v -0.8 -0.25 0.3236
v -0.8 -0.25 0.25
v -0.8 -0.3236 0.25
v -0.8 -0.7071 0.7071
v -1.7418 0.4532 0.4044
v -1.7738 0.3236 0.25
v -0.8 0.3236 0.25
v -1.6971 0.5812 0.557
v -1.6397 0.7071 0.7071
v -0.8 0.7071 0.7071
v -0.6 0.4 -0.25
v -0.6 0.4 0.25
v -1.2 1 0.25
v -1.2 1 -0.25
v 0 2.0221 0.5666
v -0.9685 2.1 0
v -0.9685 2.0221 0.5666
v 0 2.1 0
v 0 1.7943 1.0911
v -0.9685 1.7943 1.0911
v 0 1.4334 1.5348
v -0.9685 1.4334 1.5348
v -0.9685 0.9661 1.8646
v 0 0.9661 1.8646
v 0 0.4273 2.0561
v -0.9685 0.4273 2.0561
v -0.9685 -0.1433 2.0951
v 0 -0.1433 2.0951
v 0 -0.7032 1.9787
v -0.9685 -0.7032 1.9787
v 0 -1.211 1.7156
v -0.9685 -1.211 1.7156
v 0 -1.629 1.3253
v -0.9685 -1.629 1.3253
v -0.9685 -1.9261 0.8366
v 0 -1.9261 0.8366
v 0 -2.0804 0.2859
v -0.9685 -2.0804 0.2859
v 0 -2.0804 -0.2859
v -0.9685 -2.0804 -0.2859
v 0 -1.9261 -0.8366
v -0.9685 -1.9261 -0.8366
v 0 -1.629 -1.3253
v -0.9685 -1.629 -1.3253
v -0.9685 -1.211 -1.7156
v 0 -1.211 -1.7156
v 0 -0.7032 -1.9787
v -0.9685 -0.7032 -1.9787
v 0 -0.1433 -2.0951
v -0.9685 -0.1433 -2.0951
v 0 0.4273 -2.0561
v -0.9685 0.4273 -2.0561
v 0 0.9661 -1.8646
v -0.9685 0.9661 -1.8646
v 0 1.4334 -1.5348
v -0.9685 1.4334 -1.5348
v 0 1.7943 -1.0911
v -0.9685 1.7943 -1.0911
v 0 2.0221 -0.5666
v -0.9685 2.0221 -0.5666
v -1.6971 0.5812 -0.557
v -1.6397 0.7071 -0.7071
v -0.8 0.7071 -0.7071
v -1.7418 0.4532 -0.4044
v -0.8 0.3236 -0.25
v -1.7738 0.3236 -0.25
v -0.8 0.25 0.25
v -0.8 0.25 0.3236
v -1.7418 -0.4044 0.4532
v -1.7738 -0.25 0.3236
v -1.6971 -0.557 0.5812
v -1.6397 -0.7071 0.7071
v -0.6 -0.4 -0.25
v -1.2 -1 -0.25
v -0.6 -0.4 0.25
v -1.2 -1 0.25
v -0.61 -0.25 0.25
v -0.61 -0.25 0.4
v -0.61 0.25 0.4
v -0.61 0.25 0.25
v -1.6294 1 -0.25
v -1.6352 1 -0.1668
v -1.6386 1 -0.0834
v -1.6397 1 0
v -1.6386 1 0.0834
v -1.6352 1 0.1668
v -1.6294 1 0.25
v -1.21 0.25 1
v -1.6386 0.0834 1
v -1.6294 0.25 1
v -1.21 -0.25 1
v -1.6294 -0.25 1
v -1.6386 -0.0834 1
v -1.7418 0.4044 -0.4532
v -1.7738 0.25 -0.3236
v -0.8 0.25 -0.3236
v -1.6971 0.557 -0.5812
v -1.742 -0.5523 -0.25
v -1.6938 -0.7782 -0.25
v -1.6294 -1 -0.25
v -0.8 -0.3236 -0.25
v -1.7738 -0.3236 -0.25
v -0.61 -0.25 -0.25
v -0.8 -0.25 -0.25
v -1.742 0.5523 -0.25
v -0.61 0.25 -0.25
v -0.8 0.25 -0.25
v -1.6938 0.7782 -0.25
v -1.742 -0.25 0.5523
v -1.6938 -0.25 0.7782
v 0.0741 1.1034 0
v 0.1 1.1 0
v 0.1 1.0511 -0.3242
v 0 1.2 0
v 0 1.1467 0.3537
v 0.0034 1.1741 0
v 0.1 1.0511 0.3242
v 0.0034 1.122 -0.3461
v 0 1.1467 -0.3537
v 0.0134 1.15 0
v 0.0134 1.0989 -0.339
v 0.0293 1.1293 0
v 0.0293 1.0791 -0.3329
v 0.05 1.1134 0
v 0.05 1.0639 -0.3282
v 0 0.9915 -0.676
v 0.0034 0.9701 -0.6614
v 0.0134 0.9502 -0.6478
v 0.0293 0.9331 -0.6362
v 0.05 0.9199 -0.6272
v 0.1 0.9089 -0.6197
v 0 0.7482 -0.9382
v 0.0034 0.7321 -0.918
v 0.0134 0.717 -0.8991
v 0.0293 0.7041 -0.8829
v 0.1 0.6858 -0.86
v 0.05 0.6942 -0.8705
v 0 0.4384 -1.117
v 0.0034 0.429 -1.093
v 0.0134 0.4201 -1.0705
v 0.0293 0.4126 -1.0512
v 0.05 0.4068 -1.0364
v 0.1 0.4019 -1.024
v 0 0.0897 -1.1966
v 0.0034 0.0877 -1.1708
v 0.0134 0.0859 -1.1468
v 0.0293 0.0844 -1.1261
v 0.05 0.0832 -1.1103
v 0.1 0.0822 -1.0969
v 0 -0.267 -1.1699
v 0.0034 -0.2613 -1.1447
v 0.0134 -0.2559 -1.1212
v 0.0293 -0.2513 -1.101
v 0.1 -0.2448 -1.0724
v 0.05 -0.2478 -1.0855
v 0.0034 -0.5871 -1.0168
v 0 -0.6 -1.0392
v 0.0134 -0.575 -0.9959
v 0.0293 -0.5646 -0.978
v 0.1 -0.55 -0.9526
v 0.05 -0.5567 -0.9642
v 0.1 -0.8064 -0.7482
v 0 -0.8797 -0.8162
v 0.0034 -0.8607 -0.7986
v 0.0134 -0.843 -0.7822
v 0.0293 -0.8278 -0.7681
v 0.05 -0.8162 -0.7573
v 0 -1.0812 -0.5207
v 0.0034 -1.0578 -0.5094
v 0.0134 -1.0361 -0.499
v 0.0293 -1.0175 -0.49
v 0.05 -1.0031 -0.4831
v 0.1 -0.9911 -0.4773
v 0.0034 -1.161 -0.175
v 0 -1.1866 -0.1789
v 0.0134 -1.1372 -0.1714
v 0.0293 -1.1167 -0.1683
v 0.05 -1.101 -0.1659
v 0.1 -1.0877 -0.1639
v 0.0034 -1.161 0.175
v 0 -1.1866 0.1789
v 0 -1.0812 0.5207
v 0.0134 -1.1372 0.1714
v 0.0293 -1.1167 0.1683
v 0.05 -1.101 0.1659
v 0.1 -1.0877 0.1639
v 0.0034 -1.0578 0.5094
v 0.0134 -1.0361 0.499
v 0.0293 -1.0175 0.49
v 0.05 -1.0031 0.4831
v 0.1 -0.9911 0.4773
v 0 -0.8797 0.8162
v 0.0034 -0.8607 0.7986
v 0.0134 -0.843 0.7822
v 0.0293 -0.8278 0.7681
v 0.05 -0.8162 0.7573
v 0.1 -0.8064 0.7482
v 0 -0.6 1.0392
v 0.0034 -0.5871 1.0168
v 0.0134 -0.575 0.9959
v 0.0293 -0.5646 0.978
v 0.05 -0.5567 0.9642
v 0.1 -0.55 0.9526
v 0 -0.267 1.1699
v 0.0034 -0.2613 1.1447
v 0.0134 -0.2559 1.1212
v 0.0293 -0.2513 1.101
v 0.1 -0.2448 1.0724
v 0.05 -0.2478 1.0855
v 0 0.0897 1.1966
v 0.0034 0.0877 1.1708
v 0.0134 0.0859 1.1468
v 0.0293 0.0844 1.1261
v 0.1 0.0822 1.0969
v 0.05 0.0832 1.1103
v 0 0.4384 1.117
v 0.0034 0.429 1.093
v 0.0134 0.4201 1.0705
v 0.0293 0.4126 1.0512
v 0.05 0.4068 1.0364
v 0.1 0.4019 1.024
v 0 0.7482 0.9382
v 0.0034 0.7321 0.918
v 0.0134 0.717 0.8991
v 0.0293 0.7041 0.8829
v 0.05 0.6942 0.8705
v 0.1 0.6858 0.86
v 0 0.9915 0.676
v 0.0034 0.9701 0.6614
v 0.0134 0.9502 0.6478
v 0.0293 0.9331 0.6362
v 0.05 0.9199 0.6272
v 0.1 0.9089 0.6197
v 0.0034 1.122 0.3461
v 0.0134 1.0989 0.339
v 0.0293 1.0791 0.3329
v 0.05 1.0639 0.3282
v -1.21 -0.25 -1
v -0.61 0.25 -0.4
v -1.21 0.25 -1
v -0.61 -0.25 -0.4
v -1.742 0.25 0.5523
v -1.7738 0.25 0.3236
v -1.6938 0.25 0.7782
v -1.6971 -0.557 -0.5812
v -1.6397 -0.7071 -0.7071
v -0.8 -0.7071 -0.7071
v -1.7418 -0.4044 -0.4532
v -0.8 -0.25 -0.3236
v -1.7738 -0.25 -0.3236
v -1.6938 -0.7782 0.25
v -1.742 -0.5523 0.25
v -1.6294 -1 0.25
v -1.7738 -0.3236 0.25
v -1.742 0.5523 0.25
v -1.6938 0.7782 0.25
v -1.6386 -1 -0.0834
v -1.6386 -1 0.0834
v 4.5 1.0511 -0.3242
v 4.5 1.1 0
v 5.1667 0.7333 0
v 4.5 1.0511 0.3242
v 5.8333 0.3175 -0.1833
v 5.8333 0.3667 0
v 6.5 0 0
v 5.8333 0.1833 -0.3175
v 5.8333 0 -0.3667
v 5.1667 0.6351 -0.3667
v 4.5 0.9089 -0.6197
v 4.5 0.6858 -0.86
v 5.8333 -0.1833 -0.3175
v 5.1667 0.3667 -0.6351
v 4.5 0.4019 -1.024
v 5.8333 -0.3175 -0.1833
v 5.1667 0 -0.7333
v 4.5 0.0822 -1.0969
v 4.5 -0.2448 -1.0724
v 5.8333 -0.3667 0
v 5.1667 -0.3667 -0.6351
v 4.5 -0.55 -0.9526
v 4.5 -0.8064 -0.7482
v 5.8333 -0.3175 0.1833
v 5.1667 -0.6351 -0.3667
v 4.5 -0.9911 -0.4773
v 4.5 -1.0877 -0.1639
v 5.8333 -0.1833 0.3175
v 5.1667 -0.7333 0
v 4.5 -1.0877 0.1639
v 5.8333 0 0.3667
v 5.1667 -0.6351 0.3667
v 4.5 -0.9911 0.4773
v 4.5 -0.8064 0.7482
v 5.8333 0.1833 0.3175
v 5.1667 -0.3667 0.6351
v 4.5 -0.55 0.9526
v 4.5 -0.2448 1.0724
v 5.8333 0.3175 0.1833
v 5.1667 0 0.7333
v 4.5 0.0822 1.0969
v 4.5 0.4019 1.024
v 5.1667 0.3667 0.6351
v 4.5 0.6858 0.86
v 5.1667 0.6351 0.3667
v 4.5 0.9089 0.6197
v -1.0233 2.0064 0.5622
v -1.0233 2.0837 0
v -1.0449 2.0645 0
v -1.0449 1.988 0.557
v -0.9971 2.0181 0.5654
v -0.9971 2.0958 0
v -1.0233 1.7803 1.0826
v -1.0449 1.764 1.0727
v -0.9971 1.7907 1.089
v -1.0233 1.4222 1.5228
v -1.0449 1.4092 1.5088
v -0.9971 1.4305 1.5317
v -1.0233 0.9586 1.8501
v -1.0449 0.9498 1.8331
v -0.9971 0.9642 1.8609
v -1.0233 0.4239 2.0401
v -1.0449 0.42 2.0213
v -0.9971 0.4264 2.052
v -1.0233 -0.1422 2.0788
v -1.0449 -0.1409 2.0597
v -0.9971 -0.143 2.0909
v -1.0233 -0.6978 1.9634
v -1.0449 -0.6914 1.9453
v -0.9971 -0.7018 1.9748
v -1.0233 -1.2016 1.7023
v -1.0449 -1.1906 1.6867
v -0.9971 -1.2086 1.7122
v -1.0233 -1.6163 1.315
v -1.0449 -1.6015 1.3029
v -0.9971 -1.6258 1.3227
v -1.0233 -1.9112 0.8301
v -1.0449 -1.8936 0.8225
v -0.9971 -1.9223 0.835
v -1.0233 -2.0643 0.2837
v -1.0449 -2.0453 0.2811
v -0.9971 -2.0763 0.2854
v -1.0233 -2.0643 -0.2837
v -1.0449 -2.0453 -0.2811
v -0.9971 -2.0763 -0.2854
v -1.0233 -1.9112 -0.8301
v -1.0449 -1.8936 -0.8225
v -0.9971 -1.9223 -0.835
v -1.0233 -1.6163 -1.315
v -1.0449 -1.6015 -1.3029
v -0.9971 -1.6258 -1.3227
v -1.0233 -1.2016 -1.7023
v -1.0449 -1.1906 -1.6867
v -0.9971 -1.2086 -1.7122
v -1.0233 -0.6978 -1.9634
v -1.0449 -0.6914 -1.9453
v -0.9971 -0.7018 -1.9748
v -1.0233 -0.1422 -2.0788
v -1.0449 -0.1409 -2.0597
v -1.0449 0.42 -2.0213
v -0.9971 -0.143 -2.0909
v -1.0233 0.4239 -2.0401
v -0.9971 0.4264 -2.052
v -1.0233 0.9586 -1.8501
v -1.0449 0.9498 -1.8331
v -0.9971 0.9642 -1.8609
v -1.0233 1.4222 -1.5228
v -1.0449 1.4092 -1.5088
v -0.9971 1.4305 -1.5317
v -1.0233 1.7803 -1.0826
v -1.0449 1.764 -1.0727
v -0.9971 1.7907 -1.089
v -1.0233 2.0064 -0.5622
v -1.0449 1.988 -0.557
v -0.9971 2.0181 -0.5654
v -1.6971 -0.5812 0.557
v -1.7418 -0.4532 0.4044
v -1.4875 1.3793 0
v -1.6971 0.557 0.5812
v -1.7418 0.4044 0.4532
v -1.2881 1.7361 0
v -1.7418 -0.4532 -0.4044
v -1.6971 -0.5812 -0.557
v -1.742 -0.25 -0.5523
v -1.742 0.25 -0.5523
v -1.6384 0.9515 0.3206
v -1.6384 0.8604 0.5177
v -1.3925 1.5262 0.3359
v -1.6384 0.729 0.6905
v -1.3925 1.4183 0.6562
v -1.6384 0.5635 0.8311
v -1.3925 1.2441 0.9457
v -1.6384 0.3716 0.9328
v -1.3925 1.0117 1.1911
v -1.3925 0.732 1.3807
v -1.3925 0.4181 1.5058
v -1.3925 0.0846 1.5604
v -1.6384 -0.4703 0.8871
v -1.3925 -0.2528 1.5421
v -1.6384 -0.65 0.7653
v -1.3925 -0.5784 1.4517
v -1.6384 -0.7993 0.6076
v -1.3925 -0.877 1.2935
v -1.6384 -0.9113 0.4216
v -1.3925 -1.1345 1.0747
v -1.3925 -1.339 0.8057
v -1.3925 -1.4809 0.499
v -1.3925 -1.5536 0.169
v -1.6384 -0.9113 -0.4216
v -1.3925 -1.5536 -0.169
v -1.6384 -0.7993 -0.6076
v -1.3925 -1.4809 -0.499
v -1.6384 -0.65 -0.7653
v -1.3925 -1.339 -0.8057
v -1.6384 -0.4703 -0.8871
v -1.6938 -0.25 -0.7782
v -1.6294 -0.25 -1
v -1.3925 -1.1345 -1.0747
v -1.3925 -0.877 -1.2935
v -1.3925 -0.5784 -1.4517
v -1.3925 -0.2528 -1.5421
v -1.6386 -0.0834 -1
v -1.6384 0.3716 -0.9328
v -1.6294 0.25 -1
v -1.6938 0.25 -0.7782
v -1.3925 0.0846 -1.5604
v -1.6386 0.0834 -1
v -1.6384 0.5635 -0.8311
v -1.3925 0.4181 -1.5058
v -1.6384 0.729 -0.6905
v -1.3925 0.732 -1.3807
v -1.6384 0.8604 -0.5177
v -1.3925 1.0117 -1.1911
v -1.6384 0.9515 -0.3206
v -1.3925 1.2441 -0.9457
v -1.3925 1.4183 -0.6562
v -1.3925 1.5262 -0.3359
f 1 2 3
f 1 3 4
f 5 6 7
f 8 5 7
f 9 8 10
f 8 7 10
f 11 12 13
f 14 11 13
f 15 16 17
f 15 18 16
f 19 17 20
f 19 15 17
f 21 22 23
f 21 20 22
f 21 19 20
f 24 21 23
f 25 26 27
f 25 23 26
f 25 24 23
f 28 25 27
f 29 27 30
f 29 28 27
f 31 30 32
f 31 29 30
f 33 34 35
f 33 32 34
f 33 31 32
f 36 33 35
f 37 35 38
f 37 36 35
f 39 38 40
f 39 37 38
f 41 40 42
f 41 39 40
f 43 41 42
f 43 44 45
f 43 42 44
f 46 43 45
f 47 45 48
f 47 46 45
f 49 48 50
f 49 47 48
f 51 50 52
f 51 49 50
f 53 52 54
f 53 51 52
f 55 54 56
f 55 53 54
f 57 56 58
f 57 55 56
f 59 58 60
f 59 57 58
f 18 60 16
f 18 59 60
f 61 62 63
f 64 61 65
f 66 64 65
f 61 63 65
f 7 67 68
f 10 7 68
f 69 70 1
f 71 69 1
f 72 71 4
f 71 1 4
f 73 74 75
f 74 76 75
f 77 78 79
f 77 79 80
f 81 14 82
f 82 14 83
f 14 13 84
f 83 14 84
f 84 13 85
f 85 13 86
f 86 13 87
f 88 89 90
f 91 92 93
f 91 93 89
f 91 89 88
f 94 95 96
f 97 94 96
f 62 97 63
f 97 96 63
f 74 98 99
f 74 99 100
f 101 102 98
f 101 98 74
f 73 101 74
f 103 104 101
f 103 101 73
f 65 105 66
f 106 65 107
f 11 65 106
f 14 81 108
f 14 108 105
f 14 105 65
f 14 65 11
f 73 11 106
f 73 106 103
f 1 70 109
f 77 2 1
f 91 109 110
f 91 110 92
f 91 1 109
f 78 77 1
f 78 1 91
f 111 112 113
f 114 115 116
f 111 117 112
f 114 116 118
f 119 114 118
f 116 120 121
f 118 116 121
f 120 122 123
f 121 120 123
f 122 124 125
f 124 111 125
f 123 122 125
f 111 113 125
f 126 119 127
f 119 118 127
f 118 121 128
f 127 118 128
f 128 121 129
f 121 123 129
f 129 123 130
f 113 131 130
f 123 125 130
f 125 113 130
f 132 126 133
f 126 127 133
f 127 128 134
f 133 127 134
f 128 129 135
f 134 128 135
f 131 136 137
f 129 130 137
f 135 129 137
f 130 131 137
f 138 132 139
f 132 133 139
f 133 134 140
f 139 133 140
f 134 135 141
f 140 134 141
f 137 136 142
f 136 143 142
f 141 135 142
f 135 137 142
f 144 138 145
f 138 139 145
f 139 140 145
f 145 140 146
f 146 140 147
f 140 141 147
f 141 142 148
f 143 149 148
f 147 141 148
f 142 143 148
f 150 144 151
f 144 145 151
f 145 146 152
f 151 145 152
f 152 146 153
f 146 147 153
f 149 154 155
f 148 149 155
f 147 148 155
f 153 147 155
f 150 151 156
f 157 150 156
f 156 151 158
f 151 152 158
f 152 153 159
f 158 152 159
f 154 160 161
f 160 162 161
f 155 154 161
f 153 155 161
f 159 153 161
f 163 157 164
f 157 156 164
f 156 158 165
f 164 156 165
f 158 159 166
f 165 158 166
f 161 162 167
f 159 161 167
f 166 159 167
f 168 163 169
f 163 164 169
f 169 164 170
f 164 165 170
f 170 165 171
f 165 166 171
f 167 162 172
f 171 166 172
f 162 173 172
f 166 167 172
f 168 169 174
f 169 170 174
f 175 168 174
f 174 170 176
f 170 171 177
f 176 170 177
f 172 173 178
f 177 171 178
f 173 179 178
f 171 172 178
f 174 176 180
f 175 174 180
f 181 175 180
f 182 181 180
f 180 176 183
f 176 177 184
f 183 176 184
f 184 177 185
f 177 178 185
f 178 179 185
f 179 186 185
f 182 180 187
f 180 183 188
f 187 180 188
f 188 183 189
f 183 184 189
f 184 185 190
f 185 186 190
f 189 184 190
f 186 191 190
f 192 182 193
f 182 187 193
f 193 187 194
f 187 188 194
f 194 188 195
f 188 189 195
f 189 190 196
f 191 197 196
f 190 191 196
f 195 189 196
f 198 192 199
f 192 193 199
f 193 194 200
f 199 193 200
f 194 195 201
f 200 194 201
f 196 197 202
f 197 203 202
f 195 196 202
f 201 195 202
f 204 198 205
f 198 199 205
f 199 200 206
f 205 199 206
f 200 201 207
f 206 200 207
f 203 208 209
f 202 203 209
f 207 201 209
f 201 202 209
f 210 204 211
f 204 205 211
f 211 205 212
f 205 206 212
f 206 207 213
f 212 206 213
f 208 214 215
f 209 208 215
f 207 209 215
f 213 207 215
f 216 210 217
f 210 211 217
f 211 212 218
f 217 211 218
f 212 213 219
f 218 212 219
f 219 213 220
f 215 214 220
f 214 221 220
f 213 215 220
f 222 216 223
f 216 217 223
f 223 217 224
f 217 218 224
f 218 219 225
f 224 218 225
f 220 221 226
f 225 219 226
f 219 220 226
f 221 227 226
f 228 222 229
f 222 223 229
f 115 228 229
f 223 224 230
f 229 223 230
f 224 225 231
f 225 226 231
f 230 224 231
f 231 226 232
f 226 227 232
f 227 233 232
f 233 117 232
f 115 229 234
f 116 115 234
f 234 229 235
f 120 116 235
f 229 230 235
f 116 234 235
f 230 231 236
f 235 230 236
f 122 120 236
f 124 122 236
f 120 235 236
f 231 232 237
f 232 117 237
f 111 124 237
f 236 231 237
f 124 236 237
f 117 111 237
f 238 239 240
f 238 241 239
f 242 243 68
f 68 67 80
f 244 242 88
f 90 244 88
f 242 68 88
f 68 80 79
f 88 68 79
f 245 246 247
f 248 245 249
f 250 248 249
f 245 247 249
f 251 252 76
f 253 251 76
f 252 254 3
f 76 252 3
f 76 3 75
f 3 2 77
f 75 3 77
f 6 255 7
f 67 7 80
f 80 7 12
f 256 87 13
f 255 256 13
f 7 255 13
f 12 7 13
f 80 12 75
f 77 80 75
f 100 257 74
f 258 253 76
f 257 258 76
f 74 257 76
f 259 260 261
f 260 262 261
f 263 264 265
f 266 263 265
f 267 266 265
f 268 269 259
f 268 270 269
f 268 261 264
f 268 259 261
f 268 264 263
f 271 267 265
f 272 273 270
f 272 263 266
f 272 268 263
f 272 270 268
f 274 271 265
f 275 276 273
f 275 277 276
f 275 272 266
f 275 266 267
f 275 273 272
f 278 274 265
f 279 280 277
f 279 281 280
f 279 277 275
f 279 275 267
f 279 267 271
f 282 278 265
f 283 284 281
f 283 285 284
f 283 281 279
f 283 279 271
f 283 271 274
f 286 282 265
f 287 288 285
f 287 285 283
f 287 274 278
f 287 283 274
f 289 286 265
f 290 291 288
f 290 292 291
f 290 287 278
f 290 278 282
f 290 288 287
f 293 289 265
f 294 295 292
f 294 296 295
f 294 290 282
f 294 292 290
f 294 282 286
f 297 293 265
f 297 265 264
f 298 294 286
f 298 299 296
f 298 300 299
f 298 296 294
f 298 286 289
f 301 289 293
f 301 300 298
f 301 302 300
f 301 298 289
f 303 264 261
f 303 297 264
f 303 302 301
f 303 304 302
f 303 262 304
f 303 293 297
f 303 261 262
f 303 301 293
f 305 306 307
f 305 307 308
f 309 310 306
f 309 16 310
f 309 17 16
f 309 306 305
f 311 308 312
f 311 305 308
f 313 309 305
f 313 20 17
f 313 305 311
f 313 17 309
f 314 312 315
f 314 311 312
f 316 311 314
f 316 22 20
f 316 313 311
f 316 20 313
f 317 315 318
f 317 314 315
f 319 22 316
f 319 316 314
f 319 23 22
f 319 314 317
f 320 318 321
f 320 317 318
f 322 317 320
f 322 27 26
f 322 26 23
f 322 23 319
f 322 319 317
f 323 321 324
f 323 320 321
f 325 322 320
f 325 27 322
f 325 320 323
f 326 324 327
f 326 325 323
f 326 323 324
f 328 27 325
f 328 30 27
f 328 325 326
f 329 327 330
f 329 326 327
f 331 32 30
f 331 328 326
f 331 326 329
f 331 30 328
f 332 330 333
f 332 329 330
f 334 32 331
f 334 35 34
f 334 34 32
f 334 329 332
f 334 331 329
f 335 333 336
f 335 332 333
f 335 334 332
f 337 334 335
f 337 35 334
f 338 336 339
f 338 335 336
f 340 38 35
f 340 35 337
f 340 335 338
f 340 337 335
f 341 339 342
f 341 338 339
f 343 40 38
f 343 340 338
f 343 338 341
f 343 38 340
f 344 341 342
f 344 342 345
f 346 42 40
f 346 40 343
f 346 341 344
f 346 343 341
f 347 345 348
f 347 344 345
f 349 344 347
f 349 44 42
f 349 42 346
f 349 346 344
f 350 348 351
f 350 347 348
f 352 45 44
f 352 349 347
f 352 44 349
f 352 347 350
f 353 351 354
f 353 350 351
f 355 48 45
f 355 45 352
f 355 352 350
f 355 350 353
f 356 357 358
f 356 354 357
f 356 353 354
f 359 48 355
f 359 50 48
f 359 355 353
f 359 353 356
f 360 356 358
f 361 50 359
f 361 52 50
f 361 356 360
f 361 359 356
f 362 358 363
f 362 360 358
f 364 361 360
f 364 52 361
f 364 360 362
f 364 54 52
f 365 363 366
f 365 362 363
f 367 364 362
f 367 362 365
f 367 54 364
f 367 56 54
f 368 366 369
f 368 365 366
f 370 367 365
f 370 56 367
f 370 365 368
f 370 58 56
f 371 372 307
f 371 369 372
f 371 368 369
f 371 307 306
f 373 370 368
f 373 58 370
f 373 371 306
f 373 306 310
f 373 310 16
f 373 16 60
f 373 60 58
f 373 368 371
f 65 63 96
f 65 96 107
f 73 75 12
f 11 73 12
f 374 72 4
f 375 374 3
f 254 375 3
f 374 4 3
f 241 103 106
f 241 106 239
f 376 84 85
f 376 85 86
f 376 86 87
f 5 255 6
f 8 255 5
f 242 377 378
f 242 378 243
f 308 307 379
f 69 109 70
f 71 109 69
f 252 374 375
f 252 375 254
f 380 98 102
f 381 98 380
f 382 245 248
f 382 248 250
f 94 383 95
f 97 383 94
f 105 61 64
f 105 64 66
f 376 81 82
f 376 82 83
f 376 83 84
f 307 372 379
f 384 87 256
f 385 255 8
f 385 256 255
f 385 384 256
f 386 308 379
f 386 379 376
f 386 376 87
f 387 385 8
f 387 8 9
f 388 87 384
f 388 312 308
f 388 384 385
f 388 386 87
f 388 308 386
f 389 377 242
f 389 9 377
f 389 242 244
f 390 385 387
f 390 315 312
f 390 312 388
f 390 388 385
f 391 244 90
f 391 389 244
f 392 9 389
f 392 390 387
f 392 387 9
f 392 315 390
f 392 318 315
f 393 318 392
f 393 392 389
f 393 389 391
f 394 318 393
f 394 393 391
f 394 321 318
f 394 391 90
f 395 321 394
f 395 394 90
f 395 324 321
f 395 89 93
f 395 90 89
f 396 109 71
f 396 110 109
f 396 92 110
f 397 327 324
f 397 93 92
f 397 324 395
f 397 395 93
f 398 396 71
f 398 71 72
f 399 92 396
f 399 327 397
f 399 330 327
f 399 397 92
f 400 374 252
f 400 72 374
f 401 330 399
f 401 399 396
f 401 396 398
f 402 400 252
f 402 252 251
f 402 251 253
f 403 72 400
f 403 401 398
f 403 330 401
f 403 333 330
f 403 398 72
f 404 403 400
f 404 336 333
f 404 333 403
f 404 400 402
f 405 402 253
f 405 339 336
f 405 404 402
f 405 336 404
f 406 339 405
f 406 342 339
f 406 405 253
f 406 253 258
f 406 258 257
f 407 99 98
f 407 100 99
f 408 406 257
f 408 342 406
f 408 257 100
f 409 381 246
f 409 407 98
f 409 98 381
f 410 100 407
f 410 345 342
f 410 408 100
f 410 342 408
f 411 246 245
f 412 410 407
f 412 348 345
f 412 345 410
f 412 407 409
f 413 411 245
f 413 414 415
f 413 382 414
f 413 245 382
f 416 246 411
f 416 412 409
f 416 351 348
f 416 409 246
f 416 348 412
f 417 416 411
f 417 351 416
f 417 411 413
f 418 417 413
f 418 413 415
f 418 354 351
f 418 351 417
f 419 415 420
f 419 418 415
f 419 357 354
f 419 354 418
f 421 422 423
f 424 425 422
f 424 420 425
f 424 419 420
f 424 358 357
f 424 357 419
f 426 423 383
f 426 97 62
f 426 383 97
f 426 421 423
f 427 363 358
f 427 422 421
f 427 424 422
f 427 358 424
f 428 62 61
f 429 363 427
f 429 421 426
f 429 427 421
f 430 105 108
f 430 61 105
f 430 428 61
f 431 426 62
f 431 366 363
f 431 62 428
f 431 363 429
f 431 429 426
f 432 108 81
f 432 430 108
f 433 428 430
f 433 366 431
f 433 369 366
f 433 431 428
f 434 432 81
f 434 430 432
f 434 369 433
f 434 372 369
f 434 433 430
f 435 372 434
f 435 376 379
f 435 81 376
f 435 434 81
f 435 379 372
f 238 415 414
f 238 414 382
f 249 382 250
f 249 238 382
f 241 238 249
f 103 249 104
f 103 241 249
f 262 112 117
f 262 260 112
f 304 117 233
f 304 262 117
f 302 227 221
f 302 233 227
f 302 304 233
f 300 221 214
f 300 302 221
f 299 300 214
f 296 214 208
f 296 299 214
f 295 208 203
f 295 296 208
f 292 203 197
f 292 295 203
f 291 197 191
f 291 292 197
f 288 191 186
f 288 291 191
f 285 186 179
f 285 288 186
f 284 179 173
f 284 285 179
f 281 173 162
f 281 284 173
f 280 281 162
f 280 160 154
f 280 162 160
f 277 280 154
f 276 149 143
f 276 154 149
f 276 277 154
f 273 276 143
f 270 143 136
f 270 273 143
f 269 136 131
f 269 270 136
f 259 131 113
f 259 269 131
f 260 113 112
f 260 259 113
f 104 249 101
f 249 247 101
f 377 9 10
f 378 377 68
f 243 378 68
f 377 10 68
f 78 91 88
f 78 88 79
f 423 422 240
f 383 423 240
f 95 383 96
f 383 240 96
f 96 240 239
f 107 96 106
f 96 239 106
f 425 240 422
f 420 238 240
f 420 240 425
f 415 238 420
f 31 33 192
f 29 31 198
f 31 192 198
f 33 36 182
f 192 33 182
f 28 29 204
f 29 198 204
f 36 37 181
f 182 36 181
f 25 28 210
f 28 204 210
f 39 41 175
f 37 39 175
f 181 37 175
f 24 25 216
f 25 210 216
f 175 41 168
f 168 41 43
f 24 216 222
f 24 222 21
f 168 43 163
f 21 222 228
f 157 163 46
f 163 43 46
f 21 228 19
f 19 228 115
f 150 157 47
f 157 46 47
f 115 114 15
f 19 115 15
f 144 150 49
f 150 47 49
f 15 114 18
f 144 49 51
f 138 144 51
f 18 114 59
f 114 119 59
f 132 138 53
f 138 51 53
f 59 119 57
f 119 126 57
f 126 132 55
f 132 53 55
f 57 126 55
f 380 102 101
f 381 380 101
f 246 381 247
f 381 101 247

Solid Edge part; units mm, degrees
sketch "Sketch1" plane through (0, 0, 0) normal (0, 0, 1) x (1, 0, 0)
  arc A0 (-1.8, 0) -> (-1.0449, 2.0645) centre (1.4, 0) cw
  arc A1 (-1.0449, 2.0645) -> (-0.9685, 2.1) centre (-0.9685, 2) cw
  line L0 (-0.9685, 2.1) -> (0, 2.1)
  line L1 (0, 2.1) -> (0, 1.2)
  arc A2 (0, 1.2) -> (0.1, 1.1) centre (0.1, 1.2) ccw
  line L2 (0.1, 1.1) -> (4.5, 1.1)
  line L3 (4.5, 1.1) -> (6.5, 0)
  line L4 (6.5, 0) -> (-1.8, 0)
revolve "RevolvedProtrusion1" add sketch "Sketch1" angle 360 about axis through (9.5, 0, 0) along (-1, 0, 0)
cosmetic_thread "Thread1" size "M2.2"
sketch "Sketch2" plane through (0, 0, 0) normal (0, 0, 1) x (1, 0, 0)
  line L0 (-1.8, -1) -> (-1.2, -1)
  line L1 (-1.2, -1) -> (-0.6, -0.4)
  line L2 (-0.6, -0.4) -> (-0.6, 0.4)
  line L3 (-0.6, 0.4) -> (-1.2, 1)
  line L4 (-1.2, 1) -> (-1.8, 1)
  line L5 (-1.8, 1) -> (-1.8, -1)
extrude "ExtrudedCutout_1" cut sketch "Sketch2" against normal blind 0.25 and the other way blind 0.25
sketch "Sketch3" plane through (0, 0, 0) normal (0, -1, 0) x (1, 0, 0)
  line L0 (-1.9, 1) -> (-1.21, 1)
  line L1 (-1.21, 1) -> (-0.61, 0.4)
  line L2 (-0.61, 0.4) -> (-0.61, -0.4)
  line L3 (-0.61, -0.4) -> (-1.21, -1)
  line L4 (-1.21, -1) -> (-1.9, -1)
  line L5 (-1.9, -1) -> (-1.9, 1)
extrude "ExtrudedCutout_2" cut sketch "Sketch3" against normal blind 0.25 and the other way blind 0.25
sketch "Sketch4" plane through (-0.8, 0, 0) normal (1, 0, 0) x (0, 1, 0)
  line L0 (-0.7071, 0.7071) -> (-0.1138, 0)
  line L1 (-0.1138, 0) -> (-0.7071, -0.7071)
  line L2 (-0.7071, -0.7071) -> (0, -0.1138)
  line L3 (0, -0.1138) -> (0.7071, -0.7071)
  line L4 (0.7071, -0.7071) -> (0.1138, 0)
  line L5 (0.1138, 0) -> (0.7071, 0.7071)
  line L6 (0.7071, 0.7071) -> (0, 0.1138)
  line L7 (0, 0.1138) -> (-0.7071, 0.7071)
extrude "ExtrudedCutout_3" cut sketch "Sketch4" against normal blind 1.8
properties part number "bene_inox_412405-2,2X6,5"
